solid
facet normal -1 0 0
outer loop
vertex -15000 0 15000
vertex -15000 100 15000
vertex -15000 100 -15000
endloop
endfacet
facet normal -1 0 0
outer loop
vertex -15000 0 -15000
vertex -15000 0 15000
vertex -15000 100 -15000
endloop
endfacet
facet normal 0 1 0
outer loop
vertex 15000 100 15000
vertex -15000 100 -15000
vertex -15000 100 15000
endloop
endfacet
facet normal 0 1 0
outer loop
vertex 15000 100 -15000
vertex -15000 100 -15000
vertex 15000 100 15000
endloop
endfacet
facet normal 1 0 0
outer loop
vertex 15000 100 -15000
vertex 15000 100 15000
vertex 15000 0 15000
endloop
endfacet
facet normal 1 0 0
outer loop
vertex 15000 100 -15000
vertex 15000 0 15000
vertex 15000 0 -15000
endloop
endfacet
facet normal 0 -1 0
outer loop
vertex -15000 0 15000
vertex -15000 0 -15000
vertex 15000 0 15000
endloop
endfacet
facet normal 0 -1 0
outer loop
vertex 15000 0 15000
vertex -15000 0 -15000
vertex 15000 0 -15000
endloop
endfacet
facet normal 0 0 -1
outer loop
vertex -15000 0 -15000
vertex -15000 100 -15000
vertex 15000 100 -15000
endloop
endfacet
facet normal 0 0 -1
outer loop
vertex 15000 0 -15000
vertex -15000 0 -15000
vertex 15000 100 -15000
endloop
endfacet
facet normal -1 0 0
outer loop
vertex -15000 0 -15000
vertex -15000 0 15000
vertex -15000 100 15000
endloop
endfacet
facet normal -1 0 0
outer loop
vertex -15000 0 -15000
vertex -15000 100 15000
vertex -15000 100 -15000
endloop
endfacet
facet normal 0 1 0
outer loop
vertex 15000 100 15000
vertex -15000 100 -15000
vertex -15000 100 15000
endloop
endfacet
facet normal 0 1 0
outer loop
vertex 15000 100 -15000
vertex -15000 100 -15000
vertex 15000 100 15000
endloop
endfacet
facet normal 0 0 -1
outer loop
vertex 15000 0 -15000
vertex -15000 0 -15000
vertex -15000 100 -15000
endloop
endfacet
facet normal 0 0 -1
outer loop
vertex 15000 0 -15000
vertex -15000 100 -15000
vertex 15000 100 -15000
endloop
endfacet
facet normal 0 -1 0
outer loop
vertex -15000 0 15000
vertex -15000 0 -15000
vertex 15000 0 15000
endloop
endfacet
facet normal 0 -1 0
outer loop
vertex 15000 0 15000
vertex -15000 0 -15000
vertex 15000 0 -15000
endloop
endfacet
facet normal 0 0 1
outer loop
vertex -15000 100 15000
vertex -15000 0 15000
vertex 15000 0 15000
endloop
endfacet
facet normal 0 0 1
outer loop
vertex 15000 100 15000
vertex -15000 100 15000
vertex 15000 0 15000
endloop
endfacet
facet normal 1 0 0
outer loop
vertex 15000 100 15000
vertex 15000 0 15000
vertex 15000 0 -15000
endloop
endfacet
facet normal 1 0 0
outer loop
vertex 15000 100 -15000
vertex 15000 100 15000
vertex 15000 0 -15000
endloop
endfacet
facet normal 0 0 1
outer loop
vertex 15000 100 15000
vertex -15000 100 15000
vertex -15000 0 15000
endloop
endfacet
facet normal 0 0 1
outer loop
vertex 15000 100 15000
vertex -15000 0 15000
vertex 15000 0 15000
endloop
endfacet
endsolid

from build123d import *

# Parameters (mm, degrees)
SKETCH1_W           = 30000
SKETCH1_H           = 30000
BOSS_EXTRUDE1_DEPTH = 100
SKETCH2_W           = 30000
SKETCH2_H           = 30000
BOSS_EXTRUDE2_DEPTH = 100


with BuildPart() as part:
    # Sketch1 → Boss-Extrude1 (new body)
    with BuildSketch(Plane(origin=(0, 0, 0), x_dir=(1, 0, 0), z_dir=(0, 1, 0))):
        Rectangle(SKETCH1_W, SKETCH1_H)
    extrude(amount=BOSS_EXTRUDE1_DEPTH)


with BuildPart() as body_2:
    # Sketch2 → Boss-Extrude2 (new body)
    with BuildSketch(Plane(origin=(0, 100, 0), x_dir=(1, 0, 0), z_dir=(0, 1, 0))):
        Rectangle(SKETCH2_W, SKETCH2_H)
    extrude(amount=-BOSS_EXTRUDE2_DEPTH)


solid = Compound([part.part, body_2.part])
